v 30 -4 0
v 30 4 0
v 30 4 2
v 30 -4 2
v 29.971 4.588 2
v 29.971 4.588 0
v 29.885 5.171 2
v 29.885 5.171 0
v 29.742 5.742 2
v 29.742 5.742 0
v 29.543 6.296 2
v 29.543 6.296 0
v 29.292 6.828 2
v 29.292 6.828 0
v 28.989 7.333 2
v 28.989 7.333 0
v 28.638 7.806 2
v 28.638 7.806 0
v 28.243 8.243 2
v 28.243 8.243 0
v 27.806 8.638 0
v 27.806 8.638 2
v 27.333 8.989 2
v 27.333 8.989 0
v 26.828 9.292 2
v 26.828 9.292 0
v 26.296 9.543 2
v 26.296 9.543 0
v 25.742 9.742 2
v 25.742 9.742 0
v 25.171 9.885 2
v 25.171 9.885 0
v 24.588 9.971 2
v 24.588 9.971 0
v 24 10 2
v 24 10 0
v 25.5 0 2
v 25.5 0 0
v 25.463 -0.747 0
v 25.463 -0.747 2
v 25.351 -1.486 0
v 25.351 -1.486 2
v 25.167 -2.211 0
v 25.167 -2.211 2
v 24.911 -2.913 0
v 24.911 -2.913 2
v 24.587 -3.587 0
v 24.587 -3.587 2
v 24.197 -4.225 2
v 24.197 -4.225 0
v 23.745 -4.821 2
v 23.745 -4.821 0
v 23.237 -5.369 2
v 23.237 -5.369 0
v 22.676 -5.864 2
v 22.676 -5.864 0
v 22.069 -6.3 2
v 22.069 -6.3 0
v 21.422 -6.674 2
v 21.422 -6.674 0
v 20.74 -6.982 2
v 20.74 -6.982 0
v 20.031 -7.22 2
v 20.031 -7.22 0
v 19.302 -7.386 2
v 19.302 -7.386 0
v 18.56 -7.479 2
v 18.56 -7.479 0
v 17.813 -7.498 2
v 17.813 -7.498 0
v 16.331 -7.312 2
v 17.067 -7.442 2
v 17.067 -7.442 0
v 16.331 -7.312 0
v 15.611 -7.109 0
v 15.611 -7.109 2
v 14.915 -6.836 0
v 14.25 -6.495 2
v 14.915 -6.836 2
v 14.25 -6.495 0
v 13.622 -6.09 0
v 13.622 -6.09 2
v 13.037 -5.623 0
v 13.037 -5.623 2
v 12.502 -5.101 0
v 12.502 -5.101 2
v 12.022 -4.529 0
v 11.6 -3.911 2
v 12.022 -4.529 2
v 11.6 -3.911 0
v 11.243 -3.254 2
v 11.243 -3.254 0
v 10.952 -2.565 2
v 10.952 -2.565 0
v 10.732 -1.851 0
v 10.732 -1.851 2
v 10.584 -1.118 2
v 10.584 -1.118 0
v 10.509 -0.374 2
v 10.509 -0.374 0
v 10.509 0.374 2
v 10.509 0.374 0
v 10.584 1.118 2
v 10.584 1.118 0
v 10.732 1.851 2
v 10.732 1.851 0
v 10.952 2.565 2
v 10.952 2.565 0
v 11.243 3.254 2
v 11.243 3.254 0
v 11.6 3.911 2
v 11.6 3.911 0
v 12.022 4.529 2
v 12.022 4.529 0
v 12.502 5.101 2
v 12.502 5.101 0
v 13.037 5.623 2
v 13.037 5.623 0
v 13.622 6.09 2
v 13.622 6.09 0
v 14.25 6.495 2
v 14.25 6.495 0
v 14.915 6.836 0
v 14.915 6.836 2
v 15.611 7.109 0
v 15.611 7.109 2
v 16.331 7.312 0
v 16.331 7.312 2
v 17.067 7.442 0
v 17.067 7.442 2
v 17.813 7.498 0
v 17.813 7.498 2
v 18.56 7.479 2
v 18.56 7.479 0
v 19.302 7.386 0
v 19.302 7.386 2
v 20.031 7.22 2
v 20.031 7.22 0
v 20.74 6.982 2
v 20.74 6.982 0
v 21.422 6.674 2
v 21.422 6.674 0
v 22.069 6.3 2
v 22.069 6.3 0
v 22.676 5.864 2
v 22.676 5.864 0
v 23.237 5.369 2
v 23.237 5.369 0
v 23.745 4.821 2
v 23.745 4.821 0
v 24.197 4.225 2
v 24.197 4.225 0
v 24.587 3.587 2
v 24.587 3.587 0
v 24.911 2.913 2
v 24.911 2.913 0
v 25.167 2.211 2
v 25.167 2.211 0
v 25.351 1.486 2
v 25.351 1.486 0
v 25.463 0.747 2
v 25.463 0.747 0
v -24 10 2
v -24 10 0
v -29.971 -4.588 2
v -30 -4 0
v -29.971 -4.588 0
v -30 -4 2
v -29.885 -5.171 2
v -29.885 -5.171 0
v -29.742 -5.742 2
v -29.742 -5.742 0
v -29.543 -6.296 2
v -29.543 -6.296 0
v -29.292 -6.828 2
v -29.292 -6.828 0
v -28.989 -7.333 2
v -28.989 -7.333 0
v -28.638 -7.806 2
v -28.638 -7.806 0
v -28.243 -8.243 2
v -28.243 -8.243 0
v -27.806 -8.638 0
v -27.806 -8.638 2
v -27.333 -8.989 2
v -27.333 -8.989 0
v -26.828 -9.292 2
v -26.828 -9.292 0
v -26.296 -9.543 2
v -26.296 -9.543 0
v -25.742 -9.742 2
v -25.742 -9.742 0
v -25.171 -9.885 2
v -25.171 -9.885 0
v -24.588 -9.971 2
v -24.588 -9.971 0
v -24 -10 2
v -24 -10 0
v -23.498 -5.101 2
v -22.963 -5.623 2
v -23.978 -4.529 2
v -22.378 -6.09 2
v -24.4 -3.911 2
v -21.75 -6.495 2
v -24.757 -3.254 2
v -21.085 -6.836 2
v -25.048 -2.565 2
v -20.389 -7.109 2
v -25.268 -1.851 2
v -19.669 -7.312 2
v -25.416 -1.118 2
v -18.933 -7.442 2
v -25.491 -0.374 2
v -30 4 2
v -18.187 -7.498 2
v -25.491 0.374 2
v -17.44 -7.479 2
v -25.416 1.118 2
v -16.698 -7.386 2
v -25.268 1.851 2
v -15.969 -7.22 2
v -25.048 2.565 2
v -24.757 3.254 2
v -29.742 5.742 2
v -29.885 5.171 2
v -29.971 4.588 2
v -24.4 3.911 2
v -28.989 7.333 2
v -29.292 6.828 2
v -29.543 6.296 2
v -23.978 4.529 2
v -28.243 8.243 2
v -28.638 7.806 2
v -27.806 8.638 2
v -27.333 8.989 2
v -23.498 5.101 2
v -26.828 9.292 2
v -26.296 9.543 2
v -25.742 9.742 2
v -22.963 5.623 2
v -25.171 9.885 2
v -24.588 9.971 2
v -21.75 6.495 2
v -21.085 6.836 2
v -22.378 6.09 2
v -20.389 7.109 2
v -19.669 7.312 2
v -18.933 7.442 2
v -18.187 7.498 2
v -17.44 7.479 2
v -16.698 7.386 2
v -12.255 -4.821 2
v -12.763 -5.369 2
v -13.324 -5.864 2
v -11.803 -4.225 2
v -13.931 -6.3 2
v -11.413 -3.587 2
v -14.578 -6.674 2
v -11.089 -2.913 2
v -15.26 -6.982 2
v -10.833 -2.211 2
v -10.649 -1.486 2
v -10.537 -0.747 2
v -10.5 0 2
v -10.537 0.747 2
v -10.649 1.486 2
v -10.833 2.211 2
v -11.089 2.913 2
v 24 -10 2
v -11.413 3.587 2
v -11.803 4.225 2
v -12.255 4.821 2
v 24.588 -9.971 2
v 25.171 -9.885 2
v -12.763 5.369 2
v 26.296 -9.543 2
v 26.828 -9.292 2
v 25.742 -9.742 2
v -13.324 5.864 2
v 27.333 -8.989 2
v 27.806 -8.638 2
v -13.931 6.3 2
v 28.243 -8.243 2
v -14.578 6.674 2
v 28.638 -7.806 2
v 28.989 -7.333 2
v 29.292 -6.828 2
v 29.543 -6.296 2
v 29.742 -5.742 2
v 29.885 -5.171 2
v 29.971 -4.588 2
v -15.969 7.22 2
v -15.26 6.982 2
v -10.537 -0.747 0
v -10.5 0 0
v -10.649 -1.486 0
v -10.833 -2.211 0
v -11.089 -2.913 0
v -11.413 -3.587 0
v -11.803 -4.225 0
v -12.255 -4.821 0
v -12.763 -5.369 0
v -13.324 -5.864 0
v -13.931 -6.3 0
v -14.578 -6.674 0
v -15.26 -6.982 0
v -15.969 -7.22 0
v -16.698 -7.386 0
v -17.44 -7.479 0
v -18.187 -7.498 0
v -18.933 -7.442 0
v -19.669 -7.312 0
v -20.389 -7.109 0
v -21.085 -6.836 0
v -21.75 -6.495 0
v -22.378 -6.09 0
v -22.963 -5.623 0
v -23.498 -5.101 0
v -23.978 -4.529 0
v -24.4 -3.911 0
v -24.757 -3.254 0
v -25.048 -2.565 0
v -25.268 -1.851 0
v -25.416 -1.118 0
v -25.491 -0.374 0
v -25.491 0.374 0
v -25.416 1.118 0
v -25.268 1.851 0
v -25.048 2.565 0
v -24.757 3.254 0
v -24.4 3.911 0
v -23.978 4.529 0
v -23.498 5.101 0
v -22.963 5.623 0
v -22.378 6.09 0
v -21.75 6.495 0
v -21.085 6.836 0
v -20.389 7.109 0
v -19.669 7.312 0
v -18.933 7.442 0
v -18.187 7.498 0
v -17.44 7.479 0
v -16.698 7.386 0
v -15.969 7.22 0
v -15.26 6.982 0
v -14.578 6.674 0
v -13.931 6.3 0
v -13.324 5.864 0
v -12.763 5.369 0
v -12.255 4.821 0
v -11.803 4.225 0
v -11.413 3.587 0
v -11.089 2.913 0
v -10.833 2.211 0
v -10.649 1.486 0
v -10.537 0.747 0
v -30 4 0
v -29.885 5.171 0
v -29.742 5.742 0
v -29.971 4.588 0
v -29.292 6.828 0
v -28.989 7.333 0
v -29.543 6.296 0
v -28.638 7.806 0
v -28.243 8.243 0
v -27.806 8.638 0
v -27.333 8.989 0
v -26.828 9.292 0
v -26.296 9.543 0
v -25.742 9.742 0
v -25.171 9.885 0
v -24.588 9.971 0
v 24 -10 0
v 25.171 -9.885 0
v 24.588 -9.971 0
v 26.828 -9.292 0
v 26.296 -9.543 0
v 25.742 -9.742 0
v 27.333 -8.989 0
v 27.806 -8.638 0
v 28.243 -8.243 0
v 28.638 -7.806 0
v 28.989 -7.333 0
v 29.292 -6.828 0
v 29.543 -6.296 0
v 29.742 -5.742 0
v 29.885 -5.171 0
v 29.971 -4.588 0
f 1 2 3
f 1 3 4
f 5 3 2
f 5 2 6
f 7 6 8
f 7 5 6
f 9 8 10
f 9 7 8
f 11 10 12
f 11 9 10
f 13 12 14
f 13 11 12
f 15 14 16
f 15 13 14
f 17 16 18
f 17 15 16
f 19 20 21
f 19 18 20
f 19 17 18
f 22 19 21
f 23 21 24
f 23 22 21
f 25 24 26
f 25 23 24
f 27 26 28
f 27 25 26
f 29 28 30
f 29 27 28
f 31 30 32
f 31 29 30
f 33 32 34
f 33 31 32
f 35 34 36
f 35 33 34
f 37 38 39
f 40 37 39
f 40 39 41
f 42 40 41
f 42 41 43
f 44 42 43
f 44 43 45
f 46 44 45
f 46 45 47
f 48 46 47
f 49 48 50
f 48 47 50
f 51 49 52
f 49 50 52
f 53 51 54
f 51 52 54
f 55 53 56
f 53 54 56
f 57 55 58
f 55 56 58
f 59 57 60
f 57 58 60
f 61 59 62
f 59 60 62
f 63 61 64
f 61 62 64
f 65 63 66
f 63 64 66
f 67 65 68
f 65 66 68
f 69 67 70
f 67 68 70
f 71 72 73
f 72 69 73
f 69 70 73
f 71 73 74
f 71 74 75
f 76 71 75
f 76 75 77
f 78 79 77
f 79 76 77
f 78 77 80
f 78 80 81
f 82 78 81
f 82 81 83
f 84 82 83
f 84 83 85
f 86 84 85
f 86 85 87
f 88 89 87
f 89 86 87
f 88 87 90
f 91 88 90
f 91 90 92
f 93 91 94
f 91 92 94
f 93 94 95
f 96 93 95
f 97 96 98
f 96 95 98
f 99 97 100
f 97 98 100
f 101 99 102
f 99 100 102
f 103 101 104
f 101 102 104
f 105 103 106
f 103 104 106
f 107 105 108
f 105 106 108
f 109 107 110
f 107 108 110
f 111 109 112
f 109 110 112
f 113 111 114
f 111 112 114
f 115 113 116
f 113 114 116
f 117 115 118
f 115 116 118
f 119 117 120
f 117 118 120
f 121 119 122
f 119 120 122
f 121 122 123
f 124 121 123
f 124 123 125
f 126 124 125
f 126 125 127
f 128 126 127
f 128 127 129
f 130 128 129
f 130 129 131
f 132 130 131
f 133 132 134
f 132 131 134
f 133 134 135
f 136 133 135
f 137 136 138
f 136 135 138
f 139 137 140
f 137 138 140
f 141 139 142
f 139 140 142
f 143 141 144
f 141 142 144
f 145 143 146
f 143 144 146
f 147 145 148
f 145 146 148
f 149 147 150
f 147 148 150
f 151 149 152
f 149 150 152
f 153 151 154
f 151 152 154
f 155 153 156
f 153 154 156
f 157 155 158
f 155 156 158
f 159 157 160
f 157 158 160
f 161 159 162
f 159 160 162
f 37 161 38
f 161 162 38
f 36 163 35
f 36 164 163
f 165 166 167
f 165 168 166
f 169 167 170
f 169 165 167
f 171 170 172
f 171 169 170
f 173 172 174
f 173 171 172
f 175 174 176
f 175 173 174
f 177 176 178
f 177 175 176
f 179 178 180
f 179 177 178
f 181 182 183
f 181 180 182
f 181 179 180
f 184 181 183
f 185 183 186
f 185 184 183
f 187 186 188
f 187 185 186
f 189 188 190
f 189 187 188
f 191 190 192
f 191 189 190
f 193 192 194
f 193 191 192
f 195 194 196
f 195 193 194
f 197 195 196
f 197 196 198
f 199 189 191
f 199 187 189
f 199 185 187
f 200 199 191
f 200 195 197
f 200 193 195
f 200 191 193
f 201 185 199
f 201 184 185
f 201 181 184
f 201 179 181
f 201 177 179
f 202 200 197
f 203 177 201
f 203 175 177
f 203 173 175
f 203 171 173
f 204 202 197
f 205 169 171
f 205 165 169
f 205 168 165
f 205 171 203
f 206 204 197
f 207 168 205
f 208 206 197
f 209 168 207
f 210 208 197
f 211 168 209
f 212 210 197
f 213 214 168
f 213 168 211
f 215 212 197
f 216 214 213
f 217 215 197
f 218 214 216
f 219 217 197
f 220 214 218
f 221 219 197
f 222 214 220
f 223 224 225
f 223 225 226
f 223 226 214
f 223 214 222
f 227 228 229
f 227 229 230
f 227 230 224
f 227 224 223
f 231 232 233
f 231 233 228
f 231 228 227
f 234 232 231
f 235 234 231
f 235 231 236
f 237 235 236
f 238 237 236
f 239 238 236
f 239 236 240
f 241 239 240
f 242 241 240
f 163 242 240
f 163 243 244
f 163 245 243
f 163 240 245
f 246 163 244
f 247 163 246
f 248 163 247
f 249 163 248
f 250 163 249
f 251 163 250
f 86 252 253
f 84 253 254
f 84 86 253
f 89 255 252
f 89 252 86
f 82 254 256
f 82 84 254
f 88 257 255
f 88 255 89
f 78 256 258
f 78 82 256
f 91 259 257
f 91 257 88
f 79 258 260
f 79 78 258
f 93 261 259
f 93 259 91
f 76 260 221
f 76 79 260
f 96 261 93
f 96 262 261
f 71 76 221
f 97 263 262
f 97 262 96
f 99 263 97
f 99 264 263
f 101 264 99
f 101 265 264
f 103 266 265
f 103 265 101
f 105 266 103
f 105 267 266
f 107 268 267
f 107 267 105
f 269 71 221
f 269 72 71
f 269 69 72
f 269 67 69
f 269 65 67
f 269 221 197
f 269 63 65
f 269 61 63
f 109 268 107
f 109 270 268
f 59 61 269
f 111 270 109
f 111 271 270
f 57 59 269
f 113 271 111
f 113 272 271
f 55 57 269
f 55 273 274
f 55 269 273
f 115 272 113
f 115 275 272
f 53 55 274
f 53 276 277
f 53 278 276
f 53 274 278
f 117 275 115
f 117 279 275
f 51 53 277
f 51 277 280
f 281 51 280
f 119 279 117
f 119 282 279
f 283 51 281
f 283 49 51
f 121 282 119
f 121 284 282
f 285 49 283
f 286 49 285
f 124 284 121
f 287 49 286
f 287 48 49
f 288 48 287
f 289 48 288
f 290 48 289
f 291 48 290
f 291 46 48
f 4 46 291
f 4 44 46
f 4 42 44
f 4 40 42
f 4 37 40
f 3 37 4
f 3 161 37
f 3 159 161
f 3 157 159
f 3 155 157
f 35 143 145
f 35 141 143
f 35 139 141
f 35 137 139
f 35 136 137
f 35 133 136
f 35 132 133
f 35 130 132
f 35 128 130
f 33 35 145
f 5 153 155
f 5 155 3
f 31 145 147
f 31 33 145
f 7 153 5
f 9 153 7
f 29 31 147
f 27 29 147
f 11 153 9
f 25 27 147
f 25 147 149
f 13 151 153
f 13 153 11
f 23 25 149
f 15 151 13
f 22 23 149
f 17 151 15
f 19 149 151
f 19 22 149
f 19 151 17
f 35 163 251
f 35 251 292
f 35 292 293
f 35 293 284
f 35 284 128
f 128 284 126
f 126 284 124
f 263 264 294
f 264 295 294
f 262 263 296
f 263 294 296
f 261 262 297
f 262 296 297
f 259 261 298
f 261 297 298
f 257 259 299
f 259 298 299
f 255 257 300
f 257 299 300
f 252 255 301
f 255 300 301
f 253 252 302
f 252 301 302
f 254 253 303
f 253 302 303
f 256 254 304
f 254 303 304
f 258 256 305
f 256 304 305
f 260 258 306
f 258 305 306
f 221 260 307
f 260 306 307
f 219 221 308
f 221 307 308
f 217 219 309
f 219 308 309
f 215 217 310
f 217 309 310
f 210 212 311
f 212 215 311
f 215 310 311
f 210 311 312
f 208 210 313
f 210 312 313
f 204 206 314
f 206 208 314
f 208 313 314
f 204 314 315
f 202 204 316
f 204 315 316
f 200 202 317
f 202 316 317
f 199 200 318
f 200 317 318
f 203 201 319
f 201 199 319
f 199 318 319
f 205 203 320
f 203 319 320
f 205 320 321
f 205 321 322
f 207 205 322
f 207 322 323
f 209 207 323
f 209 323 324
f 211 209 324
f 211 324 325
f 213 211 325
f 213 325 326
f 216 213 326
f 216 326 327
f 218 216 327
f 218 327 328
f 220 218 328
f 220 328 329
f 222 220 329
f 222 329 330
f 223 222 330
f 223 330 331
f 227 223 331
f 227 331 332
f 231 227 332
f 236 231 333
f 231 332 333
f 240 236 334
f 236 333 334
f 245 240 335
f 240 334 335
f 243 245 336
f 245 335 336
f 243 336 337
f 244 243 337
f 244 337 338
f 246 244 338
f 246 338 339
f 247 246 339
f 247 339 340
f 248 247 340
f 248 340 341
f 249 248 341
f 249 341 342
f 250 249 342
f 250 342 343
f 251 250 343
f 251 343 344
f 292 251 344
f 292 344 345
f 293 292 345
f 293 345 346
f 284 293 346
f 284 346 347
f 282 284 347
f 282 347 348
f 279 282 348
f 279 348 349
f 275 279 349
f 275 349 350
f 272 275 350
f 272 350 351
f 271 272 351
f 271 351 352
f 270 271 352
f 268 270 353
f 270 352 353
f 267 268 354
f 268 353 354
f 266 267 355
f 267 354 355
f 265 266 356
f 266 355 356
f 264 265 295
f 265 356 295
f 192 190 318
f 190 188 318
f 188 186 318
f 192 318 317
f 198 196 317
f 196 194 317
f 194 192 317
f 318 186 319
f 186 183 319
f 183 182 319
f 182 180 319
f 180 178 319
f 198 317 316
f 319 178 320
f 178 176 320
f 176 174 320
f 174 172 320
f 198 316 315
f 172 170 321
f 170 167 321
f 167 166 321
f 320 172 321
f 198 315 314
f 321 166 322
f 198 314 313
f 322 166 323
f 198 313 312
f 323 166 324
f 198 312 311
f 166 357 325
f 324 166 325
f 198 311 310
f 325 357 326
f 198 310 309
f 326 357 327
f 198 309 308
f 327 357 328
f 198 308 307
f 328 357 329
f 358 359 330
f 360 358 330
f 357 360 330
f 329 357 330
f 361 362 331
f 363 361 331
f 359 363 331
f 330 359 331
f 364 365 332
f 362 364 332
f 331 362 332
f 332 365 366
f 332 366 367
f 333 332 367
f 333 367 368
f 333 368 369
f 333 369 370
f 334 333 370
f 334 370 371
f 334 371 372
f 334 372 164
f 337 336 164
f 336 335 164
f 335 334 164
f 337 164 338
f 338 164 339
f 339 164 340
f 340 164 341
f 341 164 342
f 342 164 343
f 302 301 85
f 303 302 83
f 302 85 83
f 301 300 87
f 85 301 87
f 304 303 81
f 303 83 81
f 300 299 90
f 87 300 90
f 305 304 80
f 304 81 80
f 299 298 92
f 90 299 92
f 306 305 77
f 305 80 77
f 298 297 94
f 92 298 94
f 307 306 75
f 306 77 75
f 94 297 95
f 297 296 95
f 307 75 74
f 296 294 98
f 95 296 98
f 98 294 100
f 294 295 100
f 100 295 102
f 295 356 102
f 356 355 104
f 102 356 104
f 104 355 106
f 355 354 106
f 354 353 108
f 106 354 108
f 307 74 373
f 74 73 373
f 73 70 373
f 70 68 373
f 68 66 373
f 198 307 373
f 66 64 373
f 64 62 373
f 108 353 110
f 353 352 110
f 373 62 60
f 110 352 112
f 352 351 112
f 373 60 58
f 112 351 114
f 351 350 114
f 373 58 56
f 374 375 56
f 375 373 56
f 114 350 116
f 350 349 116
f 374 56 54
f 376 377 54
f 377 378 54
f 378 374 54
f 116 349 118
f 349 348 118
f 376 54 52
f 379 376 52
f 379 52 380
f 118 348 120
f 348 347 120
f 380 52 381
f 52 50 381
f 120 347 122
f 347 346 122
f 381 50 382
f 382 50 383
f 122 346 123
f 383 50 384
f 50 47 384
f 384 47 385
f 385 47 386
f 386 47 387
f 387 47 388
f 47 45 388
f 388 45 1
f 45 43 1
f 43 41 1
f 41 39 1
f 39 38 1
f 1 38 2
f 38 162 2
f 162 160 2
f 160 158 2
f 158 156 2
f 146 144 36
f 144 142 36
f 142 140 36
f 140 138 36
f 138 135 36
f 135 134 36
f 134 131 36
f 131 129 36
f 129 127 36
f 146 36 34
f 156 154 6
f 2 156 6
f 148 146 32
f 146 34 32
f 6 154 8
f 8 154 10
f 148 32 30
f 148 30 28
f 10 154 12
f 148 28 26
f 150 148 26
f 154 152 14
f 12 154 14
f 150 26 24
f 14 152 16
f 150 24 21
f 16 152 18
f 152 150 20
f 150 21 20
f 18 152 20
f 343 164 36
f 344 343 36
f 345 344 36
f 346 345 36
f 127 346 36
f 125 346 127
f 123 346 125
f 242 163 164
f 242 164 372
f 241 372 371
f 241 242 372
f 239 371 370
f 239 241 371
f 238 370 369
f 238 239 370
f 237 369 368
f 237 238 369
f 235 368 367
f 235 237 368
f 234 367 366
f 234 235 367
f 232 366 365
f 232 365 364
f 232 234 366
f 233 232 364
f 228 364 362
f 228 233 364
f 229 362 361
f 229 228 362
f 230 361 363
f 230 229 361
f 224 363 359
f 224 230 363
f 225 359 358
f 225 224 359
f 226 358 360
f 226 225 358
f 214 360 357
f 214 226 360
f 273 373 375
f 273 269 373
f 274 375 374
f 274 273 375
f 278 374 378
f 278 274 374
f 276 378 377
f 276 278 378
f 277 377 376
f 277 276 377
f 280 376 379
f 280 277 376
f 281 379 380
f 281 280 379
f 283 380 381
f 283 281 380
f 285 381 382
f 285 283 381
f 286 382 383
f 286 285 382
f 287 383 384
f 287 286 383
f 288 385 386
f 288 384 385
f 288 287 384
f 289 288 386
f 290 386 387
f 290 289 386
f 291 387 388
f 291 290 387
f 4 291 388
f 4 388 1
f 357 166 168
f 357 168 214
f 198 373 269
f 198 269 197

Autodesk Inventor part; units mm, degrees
ref_plane "YZ Plane" through (0, 0, 0) normal (1, 0, 0) x (0, 1, 0)
ref_plane "XZ Plane" through (0, 0, 0) normal (0, 1, 0) x (-1, 0, 0)
ref_plane "XY Plane" through (0, 0, 0) normal (0, 0, 1) x (1, 0, 0)
sketch "Sketch1" plane through (0, 0, 0) normal (0, 0, 1) x (1, 0, 0)
  line L0 (-30, 10) -> (30, 10)
  line L1 (30, 10) -> (30, -10)
  line L2 (30, -10) -> (-30, -10)
  line L3 (-30, -10) -> (-30, 10)
  line L4 (-30, 10) -> (30, -10) construction
  line L5 (30, 10) -> (-30, -10) construction
  circle A0 centre (18, 0) radius 7.5
  circle A1 centre (-18, 0) radius 7.5
  line L6 (0, 10) -> (0, -10) construction
  point P0 (0, 0)
  point P1 (0, 0)
  dimension "d0" = 60
  dimension "d1" = 20
  dimension "d2" = 15
  dimension "d3" = 36
extrude "Plate1" add sketch "Sketch1" along normal blind 2
fillet "Corner Round1" radius 6 4 edges at (-30, 10, 1) (-30, -10, 1) (30, 10, 1) (30, -10, 1)
equation "\"d4\" = Thickness"
equation "\"BendRadius\" = Thickness"
equation "\"BendReliefWidth\" = Thickness"
equation "\"BendReliefDepth\" = 0.5 * Thickness"
equation "\"CornerReliefSize\" = 4 * Thickness"
equation "\"MinimumRemnant\" = 2 * Thickness"
equation "\"TransitionRadius\" = BendRadius"
equation "\"JacobiRadiusSize\" = BendRadius"
equation "\"GapSize\" = Thickness"
equation "\"Thickness\" = 2"
properties part number "motor pillar 2"
